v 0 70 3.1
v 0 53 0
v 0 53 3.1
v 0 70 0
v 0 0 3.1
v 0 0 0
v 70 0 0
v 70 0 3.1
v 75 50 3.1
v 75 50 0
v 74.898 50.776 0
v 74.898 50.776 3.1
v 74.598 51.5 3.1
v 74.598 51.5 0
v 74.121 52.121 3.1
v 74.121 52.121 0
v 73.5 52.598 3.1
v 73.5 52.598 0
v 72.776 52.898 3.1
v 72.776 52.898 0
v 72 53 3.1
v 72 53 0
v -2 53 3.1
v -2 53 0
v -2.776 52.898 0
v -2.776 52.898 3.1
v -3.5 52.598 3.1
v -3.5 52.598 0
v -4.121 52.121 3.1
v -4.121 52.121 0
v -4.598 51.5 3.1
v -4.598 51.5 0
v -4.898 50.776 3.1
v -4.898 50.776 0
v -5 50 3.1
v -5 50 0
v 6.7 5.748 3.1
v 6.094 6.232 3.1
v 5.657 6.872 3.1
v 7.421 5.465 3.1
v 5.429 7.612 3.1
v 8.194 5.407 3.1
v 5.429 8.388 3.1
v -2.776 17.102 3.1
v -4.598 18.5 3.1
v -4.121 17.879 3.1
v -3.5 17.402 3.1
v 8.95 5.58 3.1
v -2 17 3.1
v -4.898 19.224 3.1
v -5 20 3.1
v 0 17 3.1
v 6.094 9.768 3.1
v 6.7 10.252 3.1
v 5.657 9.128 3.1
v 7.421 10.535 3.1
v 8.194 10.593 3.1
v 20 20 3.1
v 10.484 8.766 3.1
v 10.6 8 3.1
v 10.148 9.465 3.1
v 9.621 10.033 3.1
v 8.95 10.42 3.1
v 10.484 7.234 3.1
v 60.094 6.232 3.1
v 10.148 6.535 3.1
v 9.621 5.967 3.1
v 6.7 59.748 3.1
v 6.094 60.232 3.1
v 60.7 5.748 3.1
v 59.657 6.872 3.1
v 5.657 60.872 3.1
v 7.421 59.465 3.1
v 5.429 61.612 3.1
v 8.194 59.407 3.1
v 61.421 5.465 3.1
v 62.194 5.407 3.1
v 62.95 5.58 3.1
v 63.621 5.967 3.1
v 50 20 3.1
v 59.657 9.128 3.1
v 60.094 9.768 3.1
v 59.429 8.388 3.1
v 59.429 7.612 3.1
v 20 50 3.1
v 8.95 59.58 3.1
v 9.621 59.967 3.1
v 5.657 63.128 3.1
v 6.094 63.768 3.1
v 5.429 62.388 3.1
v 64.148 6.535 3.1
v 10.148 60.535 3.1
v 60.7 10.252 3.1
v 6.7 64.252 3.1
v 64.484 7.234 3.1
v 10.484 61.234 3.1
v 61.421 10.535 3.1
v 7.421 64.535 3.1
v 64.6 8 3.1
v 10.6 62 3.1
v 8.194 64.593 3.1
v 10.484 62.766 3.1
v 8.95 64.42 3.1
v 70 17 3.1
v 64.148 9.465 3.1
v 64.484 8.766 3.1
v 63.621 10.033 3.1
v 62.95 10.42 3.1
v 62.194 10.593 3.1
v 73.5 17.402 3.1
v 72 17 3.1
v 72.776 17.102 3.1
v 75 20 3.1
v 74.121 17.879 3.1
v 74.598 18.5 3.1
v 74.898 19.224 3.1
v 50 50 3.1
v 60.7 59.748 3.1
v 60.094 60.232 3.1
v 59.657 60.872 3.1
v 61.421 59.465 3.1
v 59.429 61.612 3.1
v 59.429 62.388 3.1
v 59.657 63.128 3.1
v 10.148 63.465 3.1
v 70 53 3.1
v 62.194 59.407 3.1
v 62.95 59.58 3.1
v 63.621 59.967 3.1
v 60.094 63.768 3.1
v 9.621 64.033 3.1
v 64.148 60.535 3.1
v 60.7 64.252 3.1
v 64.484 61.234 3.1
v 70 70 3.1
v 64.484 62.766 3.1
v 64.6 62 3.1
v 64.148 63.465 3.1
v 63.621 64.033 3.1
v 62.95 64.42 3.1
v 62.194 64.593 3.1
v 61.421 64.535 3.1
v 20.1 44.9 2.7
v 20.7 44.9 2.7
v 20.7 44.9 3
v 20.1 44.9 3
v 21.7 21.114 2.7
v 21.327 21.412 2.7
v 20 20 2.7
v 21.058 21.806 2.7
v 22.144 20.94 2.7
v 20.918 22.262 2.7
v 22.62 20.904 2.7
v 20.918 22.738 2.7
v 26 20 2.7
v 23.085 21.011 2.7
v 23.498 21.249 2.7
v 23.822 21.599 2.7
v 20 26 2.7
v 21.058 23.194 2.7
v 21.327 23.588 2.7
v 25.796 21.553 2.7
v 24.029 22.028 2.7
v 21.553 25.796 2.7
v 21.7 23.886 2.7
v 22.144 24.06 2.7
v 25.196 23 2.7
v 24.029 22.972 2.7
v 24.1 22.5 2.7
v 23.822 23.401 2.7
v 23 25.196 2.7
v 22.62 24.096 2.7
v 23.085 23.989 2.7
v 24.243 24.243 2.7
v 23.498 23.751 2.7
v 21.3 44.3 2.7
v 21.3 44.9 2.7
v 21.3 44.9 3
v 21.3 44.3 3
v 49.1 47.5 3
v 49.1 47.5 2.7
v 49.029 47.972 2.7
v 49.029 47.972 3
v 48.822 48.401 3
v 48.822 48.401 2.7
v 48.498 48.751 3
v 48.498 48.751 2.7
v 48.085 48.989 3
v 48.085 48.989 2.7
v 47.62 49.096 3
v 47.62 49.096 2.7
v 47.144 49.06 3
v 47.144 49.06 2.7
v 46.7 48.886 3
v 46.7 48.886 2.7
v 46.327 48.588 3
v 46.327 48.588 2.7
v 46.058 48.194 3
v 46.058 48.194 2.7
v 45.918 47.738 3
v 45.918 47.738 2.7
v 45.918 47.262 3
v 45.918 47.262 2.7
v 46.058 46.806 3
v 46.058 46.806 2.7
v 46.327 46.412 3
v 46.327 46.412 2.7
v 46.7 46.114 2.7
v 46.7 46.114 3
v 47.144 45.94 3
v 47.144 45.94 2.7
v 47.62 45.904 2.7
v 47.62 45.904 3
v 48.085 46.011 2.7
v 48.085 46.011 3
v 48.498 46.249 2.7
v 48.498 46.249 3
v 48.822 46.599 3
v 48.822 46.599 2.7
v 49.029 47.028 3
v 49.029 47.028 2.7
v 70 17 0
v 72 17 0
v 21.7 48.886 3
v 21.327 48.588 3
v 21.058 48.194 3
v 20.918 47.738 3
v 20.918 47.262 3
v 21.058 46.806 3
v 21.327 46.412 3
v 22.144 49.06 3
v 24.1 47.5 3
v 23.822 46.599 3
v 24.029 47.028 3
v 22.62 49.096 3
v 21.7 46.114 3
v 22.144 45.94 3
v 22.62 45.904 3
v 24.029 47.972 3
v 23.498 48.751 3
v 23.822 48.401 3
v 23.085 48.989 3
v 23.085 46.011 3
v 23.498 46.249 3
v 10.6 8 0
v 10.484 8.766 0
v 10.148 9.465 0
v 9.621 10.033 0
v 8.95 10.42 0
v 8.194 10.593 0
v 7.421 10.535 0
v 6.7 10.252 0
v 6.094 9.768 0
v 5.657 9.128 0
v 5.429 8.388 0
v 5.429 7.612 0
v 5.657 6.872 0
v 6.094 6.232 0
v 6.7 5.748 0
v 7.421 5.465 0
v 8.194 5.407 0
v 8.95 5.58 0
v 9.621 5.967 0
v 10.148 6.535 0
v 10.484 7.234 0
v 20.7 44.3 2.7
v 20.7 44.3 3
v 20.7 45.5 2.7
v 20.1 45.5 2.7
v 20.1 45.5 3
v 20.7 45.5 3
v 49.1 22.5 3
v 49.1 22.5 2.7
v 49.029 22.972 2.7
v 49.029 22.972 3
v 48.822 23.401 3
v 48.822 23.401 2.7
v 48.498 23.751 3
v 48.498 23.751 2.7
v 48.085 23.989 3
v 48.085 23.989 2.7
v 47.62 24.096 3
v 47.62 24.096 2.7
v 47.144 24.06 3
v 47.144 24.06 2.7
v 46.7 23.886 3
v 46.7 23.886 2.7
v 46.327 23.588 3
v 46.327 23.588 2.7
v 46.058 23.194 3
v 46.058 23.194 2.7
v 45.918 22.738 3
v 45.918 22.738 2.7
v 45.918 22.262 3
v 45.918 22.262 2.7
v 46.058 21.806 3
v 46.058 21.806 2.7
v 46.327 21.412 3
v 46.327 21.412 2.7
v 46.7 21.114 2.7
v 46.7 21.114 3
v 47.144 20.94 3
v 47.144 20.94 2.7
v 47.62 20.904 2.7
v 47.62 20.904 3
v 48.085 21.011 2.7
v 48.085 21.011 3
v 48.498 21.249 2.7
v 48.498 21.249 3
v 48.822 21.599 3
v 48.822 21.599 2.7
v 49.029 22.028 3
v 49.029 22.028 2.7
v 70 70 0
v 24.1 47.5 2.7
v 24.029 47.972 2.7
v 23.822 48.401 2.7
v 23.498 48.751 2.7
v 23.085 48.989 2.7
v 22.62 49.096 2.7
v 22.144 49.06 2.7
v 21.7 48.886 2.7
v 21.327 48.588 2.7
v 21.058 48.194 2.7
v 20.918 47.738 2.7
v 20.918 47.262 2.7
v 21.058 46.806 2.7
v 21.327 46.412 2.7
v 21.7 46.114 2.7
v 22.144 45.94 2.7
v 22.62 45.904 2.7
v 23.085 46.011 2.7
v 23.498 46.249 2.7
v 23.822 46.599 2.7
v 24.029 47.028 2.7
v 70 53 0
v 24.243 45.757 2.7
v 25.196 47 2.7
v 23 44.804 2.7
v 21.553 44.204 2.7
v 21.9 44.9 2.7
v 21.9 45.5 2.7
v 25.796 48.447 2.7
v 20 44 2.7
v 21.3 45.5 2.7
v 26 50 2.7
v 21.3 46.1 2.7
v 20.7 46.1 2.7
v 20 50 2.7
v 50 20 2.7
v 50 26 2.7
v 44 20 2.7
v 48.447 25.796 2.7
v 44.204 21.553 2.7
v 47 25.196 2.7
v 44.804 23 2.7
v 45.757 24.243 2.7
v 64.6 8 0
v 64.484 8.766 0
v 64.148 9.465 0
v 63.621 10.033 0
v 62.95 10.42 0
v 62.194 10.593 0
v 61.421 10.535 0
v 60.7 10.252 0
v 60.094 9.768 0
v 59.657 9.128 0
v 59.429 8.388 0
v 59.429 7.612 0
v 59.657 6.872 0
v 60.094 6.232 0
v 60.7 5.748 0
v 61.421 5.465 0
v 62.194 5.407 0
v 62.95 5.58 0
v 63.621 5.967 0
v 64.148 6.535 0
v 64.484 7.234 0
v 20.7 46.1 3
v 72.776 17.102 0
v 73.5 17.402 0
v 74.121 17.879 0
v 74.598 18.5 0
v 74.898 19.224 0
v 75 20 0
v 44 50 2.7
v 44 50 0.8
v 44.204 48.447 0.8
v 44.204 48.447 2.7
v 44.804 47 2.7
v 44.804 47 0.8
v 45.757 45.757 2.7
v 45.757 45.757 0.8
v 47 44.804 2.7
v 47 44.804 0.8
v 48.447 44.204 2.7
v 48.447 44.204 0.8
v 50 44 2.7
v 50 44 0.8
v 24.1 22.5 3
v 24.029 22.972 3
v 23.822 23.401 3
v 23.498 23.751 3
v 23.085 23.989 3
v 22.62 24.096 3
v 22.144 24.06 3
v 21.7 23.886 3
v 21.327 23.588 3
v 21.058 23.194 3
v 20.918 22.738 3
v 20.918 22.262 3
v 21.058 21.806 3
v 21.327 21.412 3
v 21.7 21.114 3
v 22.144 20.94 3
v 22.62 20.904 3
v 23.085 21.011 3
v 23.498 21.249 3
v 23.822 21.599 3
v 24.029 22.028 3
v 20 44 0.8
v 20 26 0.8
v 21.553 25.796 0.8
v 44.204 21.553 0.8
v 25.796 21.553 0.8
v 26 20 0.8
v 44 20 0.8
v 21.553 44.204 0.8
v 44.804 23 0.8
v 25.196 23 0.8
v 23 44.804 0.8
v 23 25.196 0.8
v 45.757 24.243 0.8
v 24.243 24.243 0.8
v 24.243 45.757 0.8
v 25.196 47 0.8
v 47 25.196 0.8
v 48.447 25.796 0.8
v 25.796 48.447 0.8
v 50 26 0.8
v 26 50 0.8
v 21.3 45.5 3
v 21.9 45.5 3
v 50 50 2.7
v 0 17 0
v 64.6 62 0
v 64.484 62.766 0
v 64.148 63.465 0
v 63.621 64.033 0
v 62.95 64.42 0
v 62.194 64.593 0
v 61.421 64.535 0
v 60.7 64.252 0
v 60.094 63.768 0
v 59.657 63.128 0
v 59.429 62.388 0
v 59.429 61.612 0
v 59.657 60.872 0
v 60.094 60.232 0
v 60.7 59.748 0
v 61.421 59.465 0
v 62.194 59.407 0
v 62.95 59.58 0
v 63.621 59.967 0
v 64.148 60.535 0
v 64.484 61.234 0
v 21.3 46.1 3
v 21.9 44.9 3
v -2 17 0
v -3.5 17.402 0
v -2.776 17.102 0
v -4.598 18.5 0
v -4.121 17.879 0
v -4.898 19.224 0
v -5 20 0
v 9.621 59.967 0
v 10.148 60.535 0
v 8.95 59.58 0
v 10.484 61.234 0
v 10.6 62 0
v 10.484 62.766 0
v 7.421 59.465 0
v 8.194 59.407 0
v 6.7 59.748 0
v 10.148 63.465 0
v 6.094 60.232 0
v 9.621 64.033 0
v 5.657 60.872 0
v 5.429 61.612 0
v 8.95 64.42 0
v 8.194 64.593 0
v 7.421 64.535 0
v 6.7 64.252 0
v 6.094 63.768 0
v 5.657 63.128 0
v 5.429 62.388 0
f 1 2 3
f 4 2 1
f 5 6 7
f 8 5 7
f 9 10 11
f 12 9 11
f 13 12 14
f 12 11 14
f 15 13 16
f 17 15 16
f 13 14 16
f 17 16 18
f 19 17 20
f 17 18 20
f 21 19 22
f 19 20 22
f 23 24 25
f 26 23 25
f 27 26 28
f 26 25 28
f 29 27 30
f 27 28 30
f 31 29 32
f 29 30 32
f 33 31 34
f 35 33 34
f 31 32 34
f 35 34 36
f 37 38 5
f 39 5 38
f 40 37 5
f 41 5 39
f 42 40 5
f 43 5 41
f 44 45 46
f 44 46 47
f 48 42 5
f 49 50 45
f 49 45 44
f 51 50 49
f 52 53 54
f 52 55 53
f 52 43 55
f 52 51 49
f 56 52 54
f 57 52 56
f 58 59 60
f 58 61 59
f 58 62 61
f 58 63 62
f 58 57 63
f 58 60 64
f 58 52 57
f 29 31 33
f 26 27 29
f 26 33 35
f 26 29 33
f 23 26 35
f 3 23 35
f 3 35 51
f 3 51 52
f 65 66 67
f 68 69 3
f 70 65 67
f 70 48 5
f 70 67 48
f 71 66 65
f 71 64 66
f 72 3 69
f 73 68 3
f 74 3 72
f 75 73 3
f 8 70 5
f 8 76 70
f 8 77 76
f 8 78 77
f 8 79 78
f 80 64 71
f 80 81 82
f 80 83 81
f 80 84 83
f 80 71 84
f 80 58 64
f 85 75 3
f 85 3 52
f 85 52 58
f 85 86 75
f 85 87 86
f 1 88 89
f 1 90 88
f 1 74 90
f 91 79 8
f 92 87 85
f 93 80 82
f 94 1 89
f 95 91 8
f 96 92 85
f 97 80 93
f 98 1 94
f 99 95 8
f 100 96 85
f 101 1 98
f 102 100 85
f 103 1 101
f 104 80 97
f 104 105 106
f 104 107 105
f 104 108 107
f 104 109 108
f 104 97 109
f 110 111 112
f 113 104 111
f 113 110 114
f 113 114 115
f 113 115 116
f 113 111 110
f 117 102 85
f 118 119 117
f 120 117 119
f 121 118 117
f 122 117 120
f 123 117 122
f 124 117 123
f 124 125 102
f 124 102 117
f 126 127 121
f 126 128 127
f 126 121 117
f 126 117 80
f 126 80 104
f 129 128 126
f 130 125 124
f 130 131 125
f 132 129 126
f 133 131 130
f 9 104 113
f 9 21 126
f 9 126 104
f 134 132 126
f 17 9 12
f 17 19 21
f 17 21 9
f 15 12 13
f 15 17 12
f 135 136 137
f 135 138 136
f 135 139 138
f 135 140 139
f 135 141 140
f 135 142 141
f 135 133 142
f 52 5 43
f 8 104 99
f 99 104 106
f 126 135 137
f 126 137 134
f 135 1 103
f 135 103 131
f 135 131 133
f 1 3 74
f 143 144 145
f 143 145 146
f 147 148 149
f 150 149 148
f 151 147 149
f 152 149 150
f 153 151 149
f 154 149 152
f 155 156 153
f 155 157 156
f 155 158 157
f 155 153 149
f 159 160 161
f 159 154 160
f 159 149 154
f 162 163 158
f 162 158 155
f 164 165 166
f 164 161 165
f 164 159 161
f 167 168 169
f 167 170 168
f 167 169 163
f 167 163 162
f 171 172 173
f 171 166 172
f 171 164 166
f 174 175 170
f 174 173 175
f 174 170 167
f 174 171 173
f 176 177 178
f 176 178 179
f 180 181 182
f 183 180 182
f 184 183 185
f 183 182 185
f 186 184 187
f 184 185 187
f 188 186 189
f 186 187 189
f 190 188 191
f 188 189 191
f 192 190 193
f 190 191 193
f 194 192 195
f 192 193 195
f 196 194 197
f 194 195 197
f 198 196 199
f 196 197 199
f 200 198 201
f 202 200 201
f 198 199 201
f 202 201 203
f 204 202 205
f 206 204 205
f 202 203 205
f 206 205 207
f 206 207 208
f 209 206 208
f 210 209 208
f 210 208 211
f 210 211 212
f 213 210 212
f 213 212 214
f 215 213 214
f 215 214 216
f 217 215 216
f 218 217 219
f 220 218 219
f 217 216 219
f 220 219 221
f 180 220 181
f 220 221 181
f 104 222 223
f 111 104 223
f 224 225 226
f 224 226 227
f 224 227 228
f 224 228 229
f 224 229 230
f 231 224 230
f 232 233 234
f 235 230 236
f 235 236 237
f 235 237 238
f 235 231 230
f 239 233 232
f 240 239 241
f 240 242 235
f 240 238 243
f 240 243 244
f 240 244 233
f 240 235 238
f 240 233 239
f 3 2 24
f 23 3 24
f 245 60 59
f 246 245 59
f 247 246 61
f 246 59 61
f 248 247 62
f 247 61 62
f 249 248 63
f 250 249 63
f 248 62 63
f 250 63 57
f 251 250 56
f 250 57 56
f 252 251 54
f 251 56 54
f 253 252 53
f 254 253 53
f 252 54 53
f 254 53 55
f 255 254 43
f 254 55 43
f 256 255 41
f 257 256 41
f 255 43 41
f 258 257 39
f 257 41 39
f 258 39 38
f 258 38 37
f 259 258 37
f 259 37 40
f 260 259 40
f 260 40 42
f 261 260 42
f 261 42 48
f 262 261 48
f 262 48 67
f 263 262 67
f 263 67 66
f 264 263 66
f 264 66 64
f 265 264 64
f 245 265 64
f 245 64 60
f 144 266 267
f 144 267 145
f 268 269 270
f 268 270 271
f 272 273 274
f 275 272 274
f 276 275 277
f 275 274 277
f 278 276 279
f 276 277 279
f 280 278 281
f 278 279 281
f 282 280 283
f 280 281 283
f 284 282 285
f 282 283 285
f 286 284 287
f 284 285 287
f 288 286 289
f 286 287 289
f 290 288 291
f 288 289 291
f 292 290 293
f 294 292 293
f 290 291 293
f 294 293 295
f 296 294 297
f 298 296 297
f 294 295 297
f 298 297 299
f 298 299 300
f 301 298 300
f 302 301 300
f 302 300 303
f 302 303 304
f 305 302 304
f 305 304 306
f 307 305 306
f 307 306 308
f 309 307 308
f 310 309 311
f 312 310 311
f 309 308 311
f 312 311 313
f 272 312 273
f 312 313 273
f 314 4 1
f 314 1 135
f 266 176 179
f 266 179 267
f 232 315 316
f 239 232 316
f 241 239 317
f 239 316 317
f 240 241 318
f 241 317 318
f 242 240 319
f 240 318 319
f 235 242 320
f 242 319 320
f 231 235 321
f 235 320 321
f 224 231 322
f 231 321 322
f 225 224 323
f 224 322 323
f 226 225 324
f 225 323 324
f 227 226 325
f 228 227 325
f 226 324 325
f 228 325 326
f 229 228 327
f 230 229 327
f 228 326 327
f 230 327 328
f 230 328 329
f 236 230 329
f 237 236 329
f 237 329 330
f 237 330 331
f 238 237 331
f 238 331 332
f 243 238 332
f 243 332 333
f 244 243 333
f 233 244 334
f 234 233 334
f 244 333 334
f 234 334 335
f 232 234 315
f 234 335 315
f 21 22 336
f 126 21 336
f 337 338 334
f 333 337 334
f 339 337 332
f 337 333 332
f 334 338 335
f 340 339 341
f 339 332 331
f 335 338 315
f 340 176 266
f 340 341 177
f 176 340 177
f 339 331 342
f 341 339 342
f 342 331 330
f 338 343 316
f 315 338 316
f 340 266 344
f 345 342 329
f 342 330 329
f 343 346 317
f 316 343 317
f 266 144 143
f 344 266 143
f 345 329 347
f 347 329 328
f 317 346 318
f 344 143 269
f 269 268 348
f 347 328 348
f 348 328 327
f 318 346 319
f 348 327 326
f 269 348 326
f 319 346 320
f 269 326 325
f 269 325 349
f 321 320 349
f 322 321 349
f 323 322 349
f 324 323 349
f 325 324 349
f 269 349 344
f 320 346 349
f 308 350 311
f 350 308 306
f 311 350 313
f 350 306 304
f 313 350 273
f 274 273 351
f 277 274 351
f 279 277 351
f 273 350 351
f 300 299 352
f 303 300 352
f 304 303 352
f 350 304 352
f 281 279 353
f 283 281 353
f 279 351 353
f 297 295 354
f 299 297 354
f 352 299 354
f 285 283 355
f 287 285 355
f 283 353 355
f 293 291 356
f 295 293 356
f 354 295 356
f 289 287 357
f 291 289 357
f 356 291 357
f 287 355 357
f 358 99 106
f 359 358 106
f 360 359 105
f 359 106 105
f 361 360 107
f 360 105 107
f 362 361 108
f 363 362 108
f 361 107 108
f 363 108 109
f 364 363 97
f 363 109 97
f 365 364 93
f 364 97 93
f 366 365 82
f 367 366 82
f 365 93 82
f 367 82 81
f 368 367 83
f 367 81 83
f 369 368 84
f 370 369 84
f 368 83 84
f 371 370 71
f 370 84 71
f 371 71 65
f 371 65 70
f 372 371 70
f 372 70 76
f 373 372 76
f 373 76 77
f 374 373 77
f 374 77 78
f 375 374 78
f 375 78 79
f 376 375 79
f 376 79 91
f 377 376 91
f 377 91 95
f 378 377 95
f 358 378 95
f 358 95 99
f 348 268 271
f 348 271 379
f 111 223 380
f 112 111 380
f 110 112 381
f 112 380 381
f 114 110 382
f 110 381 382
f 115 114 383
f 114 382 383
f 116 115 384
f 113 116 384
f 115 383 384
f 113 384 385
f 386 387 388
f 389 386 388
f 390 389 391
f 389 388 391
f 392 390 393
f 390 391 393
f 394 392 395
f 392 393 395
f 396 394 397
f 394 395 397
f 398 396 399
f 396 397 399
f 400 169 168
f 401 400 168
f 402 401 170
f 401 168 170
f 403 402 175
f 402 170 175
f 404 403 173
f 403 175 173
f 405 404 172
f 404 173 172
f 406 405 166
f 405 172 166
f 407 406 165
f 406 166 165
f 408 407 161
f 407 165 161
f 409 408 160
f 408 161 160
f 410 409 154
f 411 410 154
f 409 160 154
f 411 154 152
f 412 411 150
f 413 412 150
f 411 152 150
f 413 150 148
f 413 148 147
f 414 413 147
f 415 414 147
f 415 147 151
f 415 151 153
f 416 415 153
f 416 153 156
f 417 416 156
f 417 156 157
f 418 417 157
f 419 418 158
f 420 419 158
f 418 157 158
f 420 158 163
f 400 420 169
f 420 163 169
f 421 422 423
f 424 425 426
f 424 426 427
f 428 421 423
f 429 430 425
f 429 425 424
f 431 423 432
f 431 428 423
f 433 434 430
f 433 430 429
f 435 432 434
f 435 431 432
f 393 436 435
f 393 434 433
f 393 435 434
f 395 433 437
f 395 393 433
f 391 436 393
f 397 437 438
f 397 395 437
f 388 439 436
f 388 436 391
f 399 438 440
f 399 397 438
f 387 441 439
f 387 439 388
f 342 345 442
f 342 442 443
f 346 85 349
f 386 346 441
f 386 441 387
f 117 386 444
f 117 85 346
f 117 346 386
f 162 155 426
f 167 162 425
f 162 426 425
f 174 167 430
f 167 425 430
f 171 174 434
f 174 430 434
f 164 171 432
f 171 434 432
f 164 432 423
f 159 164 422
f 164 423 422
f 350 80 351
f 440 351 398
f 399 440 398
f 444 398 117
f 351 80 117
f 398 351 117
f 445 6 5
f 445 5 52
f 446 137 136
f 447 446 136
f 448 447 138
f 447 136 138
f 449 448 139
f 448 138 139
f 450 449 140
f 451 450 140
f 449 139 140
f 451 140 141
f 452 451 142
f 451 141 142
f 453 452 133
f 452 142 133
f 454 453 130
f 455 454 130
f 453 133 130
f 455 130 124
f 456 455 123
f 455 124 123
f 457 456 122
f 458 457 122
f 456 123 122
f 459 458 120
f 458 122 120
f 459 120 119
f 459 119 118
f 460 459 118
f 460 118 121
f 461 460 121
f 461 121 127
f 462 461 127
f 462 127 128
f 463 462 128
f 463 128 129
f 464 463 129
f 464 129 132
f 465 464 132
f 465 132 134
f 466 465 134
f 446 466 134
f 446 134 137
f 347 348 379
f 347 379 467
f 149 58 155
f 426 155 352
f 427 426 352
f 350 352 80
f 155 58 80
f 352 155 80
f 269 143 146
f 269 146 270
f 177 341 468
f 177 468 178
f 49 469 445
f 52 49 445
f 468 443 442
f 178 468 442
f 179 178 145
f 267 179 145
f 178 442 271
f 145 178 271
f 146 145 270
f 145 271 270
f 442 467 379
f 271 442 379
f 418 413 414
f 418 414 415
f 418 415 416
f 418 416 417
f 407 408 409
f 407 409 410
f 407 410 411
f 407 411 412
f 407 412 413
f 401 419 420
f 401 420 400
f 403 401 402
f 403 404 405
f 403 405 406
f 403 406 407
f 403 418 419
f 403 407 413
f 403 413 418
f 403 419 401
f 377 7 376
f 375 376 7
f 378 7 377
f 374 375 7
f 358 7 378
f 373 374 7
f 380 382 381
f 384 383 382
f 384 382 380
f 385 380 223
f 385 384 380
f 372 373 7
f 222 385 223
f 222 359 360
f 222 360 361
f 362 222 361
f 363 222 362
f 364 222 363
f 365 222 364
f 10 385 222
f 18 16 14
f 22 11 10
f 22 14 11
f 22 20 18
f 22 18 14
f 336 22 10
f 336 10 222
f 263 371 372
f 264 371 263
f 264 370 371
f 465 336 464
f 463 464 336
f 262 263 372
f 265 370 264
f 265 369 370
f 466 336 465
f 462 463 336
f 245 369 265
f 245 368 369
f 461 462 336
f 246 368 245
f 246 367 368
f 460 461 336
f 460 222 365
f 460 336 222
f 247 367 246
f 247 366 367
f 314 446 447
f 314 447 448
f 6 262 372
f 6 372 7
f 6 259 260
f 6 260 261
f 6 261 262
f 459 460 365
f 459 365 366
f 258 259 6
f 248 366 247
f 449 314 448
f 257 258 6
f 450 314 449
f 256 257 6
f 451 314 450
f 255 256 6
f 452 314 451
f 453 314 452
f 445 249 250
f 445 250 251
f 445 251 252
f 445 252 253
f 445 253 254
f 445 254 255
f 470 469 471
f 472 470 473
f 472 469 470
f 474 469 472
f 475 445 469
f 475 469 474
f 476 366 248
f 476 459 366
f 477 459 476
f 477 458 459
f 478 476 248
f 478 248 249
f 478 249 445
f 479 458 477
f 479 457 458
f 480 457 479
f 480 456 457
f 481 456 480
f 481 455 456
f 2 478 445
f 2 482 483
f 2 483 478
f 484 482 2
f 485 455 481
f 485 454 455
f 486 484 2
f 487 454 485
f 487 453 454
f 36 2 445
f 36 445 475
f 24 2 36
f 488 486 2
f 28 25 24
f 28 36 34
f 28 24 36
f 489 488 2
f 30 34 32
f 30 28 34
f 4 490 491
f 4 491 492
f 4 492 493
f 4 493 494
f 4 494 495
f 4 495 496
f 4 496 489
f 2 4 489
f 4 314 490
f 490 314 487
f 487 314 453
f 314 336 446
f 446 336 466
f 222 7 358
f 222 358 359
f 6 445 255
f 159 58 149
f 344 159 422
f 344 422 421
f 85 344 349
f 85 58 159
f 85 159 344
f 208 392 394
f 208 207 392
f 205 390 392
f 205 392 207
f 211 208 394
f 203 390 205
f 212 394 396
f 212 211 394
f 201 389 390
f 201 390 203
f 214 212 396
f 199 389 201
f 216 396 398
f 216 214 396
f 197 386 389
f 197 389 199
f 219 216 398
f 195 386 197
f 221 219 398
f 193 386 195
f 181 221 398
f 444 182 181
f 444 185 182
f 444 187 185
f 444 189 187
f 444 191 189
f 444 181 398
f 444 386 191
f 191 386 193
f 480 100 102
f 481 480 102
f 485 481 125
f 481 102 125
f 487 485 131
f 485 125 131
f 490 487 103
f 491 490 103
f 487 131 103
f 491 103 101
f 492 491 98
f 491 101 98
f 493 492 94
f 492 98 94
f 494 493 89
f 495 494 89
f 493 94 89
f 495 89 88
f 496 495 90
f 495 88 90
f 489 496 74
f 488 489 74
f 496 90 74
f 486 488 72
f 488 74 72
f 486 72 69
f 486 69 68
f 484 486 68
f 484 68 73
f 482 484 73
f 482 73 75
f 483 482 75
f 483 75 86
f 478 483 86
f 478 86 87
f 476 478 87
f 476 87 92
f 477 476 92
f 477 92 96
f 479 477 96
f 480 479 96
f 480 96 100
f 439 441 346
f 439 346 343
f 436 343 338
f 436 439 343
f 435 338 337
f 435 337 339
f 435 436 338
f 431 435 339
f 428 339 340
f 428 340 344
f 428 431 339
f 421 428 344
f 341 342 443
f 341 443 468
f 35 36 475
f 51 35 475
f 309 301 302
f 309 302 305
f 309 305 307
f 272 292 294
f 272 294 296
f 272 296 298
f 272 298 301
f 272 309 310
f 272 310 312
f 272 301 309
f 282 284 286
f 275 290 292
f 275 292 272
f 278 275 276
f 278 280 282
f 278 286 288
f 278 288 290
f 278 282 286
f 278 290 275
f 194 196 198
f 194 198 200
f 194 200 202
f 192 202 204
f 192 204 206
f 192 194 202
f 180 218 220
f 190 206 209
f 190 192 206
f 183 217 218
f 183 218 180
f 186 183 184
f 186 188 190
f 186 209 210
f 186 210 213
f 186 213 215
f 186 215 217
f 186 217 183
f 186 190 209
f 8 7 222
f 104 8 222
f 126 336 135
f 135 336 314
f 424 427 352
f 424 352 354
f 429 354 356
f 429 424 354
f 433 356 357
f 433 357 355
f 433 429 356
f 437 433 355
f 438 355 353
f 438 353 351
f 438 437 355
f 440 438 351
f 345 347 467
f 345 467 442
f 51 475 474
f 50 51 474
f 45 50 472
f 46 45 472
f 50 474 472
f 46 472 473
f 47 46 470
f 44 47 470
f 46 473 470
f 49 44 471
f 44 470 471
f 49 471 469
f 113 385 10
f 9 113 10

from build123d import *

# Parameters (mm, degrees)
SKETCH_1_W          = 70
SKETCH_1_H          = 70
EXTRUDE_1_DEPTH     = 3.1
SKETCH_2_W          = 30
SKETCH_2_H          = 30
CUT_EXTRUDE_1_DEPTH = 2.3
SKETCH_3_R          = 2.6
CUT_EXTRUDE_2_DEPTH = 4.1
EXTRUDE_2_DEPTH     = 2.7
SKETCH_6_R          = 1.6
EXTRUDE_3_DEPTH     = 0.3


with BuildPart() as part:
    # 草图1 → 凸台-拉伸1 (new body)
    with BuildSketch(Plane.XY):
        with BuildLine():
            Line((-2, 17), (0, 17))
            Line((0, 17), (0, 53))
            Line((0, 53), (-2, 53))
            ThreePointArc((-2, 53), (-4.121320344, 52.121320344), (-5, 50))
            Line((-5, 50), (-5, 20))
            ThreePointArc((-5, 20), (-4.121320344, 17.878679656), (-2, 17))
        make_face()
        with Locations((35, 35)):
            Rectangle(SKETCH_1_W, SKETCH_1_H)
        with BuildLine():
            Line((70, 53), (70, 17))
            Line((70, 17), (72, 17))
            ThreePointArc((72, 17), (74.121320344, 17.878679656), (75, 20))
            Line((75, 20), (75, 50))
            ThreePointArc((75, 50), (74.121320344, 52.121320344), (72, 53))
            Line((72, 53), (70, 53))
        make_face()
    extrude(amount=EXTRUDE_1_DEPTH)

    # 草图2 → 切除-拉伸1 (cut)
    with BuildSketch(Plane.XY.offset(3.1)):
        with Locations((35, 35)):
            Rectangle(SKETCH_2_W, SKETCH_2_H)
    extrude(amount=-CUT_EXTRUDE_1_DEPTH, mode=Mode.SUBTRACT)

    # 草图3 → 切除-拉伸2 (cut, through all)
    with BuildSketch(Plane.XY.offset(3.1)):
        with Locations((8, 62)):
            Circle(SKETCH_3_R)
        with Locations((62, 62)):
            Circle(SKETCH_3_R)
        with Locations((8, 8)):
            Circle(SKETCH_3_R)
        with Locations((62, 8)):
            Circle(SKETCH_3_R)
    extrude(amount=-CUT_EXTRUDE_2_DEPTH, mode=Mode.SUBTRACT)

    # 草图4 → 凸台-拉伸2 (add)
    with BuildSketch(Plane.XY):
        with BuildLine():
            Line((20, 44), (20, 50))
            Line((20, 50), (26, 50))
            ThreePointArc((26, 50), (24.242640687, 45.757359313), (20, 44))
        make_face()
        with BuildLine():
            Line((50, 44), (50, 50))
            Line((50, 50), (44, 50))
            ThreePointArc((44, 50), (45.757359313, 45.757359313), (50, 44))
        make_face()
        with BuildLine():
            Line((50, 20), (44, 20))
            ThreePointArc((44, 20), (45.757359313, 24.242640687), (50, 26))
            Line((50, 26), (50, 20))
        make_face()
        with BuildLine():
            Line((20, 26), (20, 20))
            Line((20, 20), (26, 20))
            ThreePointArc((26, 20), (24.242640687, 24.242640687), (20, 26))
        make_face()
    extrude(amount=EXTRUDE_2_DEPTH)

    # 草图6 → 凸台-拉伸3 (add)
    with BuildSketch(Plane.XY.offset(2.7)):
        with Locations((22.5, 47.5)):
            Circle(SKETCH_6_R)
        with Locations((47.5, 47.5)):
            Circle(SKETCH_6_R)
        with Locations((47.5, 22.5)):
            Circle(SKETCH_6_R)
        with Locations((22.5, 22.5)):
            Circle(SKETCH_6_R)
        Polygon((20.1, 45.5), (20.7, 45.5), (20.7, 46.1), (21.3, 46.1), (21.3, 45.5), (21.9, 45.5), (21.9, 44.9), (21.3, 44.9), (21.3, 44.3), (20.7, 44.3), (20.7, 44.9), (20.1, 44.9), align=None)
    extrude(amount=EXTRUDE_3_DEPTH)


solid = part.part
